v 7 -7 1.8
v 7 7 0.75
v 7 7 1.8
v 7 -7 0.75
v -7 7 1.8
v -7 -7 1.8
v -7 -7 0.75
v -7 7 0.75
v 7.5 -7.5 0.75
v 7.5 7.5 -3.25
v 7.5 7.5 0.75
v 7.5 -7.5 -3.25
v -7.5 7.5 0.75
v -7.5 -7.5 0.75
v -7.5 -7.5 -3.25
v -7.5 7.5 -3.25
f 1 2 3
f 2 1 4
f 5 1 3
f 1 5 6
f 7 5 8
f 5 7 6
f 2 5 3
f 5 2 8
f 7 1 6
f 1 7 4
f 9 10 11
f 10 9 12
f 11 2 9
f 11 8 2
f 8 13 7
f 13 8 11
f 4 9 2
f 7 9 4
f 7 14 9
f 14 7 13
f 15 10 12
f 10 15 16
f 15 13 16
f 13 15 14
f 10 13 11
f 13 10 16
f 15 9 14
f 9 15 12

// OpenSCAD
plate_thickness = 1;
plate_size = 15.6;
edge_offset = 1;
bottom_size = plate_size - 2;

top_height = 11.6;

switch_height = 3.6;
switch_thick = 1;
switch_width = 5;
switch_length = 3;

cap_height = .38*25.4;
cap_heightShift = 10;
cap_width = 18.3;
cap_h = 7.5;

module SwitchLow(colors = "teal") 
{
  translate([0,0,1.75]){
    difference(){
      translate([0,0,0.5])cube([15,15,1], center = true);
      //cuts
  //    translate([15/2-1/2,0,.5])cube([1,10.5,2], center = true);
  //    translate([-15/2+1/2,0,.5])cube([1,10.5,2], center = true);
    }

    translate([0,0,1.5])cube([13,13,2], center = true);
    color("springGreen")translate([0,0,4])cube([11.4,4,3], center = true);
    color("springGreen")translate([0,1,4])cube([3,5,3], center = true);
    color("DarkSlateGray")translate([0,0,-1])cube([13,14,2,],center = true);
    color("DarkSlateGray")translate([0,0,-2-2.5])cylinder(d=3.3, 2.5);
    color("DarkSlateGray")translate([5,0,-2-2.5])cylinder(d=1.6, 2.5); 
    color("DarkSlateGray")translate([-5,0,-2-2.5])cylinder(d=1.6, 2.5); 

    //cap
    color("ivory")hull(){
      translate([0,0,4.5+1])cube([17.5,16.8,2],center = true);
      translate([0,1.25,4.5+1+1.5])cube([14.5,12.5,1.5],center = true);
    }
  }
}

module Cutter()
{
  bottom_height = 4.5;
  bottom_chamfer_width = 3;
  bottom_chamfer_height =  1;
  bottom_chamfer_thickness = .6;

  bottom_peg_diameter = 4;
  bottom_peg_height =  3;
  bottom_peg_chamfer = 1;
  bottom_peg_side_scale = 1.7/4;
  
  translate([-bottom_size/2, -bottom_size/2 ,0])cube([bottom_size,bottom_size,bottom_height]);

  translate([0,0, -(bottom_peg_height -bottom_peg_chamfer)]){
    cylinder(d=bottom_peg_diameter, h= bottom_peg_height -bottom_peg_chamfer);
    translate([5,0,0])scale(v=[bottom_peg_side_scale,bottom_peg_side_scale,1])cylinder(d=bottom_peg_diameter, h= bottom_peg_height -bottom_peg_chamfer);
    translate([-5,0,0])scale(v=[bottom_peg_side_scale,bottom_peg_side_scale,1])cylinder(d=bottom_peg_diameter, h= bottom_peg_height -bottom_peg_chamfer);
    
    translate([0,0, -bottom_peg_chamfer]){
      cylinder(d2=bottom_peg_diameter , d1 = bottom_peg_diameter -2*bottom_peg_chamfer, h= bottom_peg_chamfer);
      translate([5,0,0])scale(v=[bottom_peg_side_scale,bottom_peg_side_scale,1])cylinder(d2=bottom_peg_diameter , d1 = bottom_peg_diameter -2*bottom_peg_chamfer, h= bottom_peg_chamfer);
      translate([-5,0,0])scale(v=[bottom_peg_side_scale,bottom_peg_side_scale,1])cylinder(d2=bottom_peg_diameter , d1 = bottom_peg_diameter -2*bottom_peg_chamfer, h= bottom_peg_chamfer);
    }
  }
}


module Keyhole(tol = .1, cutThickness = 3){
  $fn = 40;
  bottom_length = 13.9+tol;
  plate_thickness = 1; //mm
  holeLength = bottom_length;
  //latch nibs
  nib_radius= .5;
  nib_length = 11; 

  translate([0,0,1.25])cube([holeLength, holeLength, plate_thickness+tol], center =true);
  translate([0,0,.25-cutThickness/2])cube([holeLength+1, holeLength+1, plate_thickness+cutThickness], center =true);  
}

module TrackToKahli(tol = 0){
  ad_height = 7;
  difference(){
    translate([-7,-3,0])cube([14,6,ad_height]);
    #translate([0,0,0])cylinder(d=3.3, 2.5, $fn=60);
    translate([5,0,0])cylinder(d=1.6, 2.5,$fn=60); 
    translate([-5,0,0])cylinder(d=1.6, 2.5,$fn=60); 
    #translate([-2.5/2,-2.5/2,ad_height -2.2])cube([2.5,2.5,2.2]);
    }
}

//TrackToKahli();
//translate([0,0,0])SwitchLow();
Keyhole(.1);


module TrackPoint(nibLength = 20){
  color("silver")translate([0,28.5/2-6,-1/2])cube([26.46, 28.5, 1], center = true);
  color("red")translate([0,0,2.5/2])cube([2.5,2.5,2.5], center= true); //nib
  //    color("gold")cylinder(d = 2, nibLength); //nib
  //    color("gold")translate([0,0,nibLength])sphere(2); //nib

}
//Switch([1,1.5,1]);
//Stabilizer();
//TrackPoint();
